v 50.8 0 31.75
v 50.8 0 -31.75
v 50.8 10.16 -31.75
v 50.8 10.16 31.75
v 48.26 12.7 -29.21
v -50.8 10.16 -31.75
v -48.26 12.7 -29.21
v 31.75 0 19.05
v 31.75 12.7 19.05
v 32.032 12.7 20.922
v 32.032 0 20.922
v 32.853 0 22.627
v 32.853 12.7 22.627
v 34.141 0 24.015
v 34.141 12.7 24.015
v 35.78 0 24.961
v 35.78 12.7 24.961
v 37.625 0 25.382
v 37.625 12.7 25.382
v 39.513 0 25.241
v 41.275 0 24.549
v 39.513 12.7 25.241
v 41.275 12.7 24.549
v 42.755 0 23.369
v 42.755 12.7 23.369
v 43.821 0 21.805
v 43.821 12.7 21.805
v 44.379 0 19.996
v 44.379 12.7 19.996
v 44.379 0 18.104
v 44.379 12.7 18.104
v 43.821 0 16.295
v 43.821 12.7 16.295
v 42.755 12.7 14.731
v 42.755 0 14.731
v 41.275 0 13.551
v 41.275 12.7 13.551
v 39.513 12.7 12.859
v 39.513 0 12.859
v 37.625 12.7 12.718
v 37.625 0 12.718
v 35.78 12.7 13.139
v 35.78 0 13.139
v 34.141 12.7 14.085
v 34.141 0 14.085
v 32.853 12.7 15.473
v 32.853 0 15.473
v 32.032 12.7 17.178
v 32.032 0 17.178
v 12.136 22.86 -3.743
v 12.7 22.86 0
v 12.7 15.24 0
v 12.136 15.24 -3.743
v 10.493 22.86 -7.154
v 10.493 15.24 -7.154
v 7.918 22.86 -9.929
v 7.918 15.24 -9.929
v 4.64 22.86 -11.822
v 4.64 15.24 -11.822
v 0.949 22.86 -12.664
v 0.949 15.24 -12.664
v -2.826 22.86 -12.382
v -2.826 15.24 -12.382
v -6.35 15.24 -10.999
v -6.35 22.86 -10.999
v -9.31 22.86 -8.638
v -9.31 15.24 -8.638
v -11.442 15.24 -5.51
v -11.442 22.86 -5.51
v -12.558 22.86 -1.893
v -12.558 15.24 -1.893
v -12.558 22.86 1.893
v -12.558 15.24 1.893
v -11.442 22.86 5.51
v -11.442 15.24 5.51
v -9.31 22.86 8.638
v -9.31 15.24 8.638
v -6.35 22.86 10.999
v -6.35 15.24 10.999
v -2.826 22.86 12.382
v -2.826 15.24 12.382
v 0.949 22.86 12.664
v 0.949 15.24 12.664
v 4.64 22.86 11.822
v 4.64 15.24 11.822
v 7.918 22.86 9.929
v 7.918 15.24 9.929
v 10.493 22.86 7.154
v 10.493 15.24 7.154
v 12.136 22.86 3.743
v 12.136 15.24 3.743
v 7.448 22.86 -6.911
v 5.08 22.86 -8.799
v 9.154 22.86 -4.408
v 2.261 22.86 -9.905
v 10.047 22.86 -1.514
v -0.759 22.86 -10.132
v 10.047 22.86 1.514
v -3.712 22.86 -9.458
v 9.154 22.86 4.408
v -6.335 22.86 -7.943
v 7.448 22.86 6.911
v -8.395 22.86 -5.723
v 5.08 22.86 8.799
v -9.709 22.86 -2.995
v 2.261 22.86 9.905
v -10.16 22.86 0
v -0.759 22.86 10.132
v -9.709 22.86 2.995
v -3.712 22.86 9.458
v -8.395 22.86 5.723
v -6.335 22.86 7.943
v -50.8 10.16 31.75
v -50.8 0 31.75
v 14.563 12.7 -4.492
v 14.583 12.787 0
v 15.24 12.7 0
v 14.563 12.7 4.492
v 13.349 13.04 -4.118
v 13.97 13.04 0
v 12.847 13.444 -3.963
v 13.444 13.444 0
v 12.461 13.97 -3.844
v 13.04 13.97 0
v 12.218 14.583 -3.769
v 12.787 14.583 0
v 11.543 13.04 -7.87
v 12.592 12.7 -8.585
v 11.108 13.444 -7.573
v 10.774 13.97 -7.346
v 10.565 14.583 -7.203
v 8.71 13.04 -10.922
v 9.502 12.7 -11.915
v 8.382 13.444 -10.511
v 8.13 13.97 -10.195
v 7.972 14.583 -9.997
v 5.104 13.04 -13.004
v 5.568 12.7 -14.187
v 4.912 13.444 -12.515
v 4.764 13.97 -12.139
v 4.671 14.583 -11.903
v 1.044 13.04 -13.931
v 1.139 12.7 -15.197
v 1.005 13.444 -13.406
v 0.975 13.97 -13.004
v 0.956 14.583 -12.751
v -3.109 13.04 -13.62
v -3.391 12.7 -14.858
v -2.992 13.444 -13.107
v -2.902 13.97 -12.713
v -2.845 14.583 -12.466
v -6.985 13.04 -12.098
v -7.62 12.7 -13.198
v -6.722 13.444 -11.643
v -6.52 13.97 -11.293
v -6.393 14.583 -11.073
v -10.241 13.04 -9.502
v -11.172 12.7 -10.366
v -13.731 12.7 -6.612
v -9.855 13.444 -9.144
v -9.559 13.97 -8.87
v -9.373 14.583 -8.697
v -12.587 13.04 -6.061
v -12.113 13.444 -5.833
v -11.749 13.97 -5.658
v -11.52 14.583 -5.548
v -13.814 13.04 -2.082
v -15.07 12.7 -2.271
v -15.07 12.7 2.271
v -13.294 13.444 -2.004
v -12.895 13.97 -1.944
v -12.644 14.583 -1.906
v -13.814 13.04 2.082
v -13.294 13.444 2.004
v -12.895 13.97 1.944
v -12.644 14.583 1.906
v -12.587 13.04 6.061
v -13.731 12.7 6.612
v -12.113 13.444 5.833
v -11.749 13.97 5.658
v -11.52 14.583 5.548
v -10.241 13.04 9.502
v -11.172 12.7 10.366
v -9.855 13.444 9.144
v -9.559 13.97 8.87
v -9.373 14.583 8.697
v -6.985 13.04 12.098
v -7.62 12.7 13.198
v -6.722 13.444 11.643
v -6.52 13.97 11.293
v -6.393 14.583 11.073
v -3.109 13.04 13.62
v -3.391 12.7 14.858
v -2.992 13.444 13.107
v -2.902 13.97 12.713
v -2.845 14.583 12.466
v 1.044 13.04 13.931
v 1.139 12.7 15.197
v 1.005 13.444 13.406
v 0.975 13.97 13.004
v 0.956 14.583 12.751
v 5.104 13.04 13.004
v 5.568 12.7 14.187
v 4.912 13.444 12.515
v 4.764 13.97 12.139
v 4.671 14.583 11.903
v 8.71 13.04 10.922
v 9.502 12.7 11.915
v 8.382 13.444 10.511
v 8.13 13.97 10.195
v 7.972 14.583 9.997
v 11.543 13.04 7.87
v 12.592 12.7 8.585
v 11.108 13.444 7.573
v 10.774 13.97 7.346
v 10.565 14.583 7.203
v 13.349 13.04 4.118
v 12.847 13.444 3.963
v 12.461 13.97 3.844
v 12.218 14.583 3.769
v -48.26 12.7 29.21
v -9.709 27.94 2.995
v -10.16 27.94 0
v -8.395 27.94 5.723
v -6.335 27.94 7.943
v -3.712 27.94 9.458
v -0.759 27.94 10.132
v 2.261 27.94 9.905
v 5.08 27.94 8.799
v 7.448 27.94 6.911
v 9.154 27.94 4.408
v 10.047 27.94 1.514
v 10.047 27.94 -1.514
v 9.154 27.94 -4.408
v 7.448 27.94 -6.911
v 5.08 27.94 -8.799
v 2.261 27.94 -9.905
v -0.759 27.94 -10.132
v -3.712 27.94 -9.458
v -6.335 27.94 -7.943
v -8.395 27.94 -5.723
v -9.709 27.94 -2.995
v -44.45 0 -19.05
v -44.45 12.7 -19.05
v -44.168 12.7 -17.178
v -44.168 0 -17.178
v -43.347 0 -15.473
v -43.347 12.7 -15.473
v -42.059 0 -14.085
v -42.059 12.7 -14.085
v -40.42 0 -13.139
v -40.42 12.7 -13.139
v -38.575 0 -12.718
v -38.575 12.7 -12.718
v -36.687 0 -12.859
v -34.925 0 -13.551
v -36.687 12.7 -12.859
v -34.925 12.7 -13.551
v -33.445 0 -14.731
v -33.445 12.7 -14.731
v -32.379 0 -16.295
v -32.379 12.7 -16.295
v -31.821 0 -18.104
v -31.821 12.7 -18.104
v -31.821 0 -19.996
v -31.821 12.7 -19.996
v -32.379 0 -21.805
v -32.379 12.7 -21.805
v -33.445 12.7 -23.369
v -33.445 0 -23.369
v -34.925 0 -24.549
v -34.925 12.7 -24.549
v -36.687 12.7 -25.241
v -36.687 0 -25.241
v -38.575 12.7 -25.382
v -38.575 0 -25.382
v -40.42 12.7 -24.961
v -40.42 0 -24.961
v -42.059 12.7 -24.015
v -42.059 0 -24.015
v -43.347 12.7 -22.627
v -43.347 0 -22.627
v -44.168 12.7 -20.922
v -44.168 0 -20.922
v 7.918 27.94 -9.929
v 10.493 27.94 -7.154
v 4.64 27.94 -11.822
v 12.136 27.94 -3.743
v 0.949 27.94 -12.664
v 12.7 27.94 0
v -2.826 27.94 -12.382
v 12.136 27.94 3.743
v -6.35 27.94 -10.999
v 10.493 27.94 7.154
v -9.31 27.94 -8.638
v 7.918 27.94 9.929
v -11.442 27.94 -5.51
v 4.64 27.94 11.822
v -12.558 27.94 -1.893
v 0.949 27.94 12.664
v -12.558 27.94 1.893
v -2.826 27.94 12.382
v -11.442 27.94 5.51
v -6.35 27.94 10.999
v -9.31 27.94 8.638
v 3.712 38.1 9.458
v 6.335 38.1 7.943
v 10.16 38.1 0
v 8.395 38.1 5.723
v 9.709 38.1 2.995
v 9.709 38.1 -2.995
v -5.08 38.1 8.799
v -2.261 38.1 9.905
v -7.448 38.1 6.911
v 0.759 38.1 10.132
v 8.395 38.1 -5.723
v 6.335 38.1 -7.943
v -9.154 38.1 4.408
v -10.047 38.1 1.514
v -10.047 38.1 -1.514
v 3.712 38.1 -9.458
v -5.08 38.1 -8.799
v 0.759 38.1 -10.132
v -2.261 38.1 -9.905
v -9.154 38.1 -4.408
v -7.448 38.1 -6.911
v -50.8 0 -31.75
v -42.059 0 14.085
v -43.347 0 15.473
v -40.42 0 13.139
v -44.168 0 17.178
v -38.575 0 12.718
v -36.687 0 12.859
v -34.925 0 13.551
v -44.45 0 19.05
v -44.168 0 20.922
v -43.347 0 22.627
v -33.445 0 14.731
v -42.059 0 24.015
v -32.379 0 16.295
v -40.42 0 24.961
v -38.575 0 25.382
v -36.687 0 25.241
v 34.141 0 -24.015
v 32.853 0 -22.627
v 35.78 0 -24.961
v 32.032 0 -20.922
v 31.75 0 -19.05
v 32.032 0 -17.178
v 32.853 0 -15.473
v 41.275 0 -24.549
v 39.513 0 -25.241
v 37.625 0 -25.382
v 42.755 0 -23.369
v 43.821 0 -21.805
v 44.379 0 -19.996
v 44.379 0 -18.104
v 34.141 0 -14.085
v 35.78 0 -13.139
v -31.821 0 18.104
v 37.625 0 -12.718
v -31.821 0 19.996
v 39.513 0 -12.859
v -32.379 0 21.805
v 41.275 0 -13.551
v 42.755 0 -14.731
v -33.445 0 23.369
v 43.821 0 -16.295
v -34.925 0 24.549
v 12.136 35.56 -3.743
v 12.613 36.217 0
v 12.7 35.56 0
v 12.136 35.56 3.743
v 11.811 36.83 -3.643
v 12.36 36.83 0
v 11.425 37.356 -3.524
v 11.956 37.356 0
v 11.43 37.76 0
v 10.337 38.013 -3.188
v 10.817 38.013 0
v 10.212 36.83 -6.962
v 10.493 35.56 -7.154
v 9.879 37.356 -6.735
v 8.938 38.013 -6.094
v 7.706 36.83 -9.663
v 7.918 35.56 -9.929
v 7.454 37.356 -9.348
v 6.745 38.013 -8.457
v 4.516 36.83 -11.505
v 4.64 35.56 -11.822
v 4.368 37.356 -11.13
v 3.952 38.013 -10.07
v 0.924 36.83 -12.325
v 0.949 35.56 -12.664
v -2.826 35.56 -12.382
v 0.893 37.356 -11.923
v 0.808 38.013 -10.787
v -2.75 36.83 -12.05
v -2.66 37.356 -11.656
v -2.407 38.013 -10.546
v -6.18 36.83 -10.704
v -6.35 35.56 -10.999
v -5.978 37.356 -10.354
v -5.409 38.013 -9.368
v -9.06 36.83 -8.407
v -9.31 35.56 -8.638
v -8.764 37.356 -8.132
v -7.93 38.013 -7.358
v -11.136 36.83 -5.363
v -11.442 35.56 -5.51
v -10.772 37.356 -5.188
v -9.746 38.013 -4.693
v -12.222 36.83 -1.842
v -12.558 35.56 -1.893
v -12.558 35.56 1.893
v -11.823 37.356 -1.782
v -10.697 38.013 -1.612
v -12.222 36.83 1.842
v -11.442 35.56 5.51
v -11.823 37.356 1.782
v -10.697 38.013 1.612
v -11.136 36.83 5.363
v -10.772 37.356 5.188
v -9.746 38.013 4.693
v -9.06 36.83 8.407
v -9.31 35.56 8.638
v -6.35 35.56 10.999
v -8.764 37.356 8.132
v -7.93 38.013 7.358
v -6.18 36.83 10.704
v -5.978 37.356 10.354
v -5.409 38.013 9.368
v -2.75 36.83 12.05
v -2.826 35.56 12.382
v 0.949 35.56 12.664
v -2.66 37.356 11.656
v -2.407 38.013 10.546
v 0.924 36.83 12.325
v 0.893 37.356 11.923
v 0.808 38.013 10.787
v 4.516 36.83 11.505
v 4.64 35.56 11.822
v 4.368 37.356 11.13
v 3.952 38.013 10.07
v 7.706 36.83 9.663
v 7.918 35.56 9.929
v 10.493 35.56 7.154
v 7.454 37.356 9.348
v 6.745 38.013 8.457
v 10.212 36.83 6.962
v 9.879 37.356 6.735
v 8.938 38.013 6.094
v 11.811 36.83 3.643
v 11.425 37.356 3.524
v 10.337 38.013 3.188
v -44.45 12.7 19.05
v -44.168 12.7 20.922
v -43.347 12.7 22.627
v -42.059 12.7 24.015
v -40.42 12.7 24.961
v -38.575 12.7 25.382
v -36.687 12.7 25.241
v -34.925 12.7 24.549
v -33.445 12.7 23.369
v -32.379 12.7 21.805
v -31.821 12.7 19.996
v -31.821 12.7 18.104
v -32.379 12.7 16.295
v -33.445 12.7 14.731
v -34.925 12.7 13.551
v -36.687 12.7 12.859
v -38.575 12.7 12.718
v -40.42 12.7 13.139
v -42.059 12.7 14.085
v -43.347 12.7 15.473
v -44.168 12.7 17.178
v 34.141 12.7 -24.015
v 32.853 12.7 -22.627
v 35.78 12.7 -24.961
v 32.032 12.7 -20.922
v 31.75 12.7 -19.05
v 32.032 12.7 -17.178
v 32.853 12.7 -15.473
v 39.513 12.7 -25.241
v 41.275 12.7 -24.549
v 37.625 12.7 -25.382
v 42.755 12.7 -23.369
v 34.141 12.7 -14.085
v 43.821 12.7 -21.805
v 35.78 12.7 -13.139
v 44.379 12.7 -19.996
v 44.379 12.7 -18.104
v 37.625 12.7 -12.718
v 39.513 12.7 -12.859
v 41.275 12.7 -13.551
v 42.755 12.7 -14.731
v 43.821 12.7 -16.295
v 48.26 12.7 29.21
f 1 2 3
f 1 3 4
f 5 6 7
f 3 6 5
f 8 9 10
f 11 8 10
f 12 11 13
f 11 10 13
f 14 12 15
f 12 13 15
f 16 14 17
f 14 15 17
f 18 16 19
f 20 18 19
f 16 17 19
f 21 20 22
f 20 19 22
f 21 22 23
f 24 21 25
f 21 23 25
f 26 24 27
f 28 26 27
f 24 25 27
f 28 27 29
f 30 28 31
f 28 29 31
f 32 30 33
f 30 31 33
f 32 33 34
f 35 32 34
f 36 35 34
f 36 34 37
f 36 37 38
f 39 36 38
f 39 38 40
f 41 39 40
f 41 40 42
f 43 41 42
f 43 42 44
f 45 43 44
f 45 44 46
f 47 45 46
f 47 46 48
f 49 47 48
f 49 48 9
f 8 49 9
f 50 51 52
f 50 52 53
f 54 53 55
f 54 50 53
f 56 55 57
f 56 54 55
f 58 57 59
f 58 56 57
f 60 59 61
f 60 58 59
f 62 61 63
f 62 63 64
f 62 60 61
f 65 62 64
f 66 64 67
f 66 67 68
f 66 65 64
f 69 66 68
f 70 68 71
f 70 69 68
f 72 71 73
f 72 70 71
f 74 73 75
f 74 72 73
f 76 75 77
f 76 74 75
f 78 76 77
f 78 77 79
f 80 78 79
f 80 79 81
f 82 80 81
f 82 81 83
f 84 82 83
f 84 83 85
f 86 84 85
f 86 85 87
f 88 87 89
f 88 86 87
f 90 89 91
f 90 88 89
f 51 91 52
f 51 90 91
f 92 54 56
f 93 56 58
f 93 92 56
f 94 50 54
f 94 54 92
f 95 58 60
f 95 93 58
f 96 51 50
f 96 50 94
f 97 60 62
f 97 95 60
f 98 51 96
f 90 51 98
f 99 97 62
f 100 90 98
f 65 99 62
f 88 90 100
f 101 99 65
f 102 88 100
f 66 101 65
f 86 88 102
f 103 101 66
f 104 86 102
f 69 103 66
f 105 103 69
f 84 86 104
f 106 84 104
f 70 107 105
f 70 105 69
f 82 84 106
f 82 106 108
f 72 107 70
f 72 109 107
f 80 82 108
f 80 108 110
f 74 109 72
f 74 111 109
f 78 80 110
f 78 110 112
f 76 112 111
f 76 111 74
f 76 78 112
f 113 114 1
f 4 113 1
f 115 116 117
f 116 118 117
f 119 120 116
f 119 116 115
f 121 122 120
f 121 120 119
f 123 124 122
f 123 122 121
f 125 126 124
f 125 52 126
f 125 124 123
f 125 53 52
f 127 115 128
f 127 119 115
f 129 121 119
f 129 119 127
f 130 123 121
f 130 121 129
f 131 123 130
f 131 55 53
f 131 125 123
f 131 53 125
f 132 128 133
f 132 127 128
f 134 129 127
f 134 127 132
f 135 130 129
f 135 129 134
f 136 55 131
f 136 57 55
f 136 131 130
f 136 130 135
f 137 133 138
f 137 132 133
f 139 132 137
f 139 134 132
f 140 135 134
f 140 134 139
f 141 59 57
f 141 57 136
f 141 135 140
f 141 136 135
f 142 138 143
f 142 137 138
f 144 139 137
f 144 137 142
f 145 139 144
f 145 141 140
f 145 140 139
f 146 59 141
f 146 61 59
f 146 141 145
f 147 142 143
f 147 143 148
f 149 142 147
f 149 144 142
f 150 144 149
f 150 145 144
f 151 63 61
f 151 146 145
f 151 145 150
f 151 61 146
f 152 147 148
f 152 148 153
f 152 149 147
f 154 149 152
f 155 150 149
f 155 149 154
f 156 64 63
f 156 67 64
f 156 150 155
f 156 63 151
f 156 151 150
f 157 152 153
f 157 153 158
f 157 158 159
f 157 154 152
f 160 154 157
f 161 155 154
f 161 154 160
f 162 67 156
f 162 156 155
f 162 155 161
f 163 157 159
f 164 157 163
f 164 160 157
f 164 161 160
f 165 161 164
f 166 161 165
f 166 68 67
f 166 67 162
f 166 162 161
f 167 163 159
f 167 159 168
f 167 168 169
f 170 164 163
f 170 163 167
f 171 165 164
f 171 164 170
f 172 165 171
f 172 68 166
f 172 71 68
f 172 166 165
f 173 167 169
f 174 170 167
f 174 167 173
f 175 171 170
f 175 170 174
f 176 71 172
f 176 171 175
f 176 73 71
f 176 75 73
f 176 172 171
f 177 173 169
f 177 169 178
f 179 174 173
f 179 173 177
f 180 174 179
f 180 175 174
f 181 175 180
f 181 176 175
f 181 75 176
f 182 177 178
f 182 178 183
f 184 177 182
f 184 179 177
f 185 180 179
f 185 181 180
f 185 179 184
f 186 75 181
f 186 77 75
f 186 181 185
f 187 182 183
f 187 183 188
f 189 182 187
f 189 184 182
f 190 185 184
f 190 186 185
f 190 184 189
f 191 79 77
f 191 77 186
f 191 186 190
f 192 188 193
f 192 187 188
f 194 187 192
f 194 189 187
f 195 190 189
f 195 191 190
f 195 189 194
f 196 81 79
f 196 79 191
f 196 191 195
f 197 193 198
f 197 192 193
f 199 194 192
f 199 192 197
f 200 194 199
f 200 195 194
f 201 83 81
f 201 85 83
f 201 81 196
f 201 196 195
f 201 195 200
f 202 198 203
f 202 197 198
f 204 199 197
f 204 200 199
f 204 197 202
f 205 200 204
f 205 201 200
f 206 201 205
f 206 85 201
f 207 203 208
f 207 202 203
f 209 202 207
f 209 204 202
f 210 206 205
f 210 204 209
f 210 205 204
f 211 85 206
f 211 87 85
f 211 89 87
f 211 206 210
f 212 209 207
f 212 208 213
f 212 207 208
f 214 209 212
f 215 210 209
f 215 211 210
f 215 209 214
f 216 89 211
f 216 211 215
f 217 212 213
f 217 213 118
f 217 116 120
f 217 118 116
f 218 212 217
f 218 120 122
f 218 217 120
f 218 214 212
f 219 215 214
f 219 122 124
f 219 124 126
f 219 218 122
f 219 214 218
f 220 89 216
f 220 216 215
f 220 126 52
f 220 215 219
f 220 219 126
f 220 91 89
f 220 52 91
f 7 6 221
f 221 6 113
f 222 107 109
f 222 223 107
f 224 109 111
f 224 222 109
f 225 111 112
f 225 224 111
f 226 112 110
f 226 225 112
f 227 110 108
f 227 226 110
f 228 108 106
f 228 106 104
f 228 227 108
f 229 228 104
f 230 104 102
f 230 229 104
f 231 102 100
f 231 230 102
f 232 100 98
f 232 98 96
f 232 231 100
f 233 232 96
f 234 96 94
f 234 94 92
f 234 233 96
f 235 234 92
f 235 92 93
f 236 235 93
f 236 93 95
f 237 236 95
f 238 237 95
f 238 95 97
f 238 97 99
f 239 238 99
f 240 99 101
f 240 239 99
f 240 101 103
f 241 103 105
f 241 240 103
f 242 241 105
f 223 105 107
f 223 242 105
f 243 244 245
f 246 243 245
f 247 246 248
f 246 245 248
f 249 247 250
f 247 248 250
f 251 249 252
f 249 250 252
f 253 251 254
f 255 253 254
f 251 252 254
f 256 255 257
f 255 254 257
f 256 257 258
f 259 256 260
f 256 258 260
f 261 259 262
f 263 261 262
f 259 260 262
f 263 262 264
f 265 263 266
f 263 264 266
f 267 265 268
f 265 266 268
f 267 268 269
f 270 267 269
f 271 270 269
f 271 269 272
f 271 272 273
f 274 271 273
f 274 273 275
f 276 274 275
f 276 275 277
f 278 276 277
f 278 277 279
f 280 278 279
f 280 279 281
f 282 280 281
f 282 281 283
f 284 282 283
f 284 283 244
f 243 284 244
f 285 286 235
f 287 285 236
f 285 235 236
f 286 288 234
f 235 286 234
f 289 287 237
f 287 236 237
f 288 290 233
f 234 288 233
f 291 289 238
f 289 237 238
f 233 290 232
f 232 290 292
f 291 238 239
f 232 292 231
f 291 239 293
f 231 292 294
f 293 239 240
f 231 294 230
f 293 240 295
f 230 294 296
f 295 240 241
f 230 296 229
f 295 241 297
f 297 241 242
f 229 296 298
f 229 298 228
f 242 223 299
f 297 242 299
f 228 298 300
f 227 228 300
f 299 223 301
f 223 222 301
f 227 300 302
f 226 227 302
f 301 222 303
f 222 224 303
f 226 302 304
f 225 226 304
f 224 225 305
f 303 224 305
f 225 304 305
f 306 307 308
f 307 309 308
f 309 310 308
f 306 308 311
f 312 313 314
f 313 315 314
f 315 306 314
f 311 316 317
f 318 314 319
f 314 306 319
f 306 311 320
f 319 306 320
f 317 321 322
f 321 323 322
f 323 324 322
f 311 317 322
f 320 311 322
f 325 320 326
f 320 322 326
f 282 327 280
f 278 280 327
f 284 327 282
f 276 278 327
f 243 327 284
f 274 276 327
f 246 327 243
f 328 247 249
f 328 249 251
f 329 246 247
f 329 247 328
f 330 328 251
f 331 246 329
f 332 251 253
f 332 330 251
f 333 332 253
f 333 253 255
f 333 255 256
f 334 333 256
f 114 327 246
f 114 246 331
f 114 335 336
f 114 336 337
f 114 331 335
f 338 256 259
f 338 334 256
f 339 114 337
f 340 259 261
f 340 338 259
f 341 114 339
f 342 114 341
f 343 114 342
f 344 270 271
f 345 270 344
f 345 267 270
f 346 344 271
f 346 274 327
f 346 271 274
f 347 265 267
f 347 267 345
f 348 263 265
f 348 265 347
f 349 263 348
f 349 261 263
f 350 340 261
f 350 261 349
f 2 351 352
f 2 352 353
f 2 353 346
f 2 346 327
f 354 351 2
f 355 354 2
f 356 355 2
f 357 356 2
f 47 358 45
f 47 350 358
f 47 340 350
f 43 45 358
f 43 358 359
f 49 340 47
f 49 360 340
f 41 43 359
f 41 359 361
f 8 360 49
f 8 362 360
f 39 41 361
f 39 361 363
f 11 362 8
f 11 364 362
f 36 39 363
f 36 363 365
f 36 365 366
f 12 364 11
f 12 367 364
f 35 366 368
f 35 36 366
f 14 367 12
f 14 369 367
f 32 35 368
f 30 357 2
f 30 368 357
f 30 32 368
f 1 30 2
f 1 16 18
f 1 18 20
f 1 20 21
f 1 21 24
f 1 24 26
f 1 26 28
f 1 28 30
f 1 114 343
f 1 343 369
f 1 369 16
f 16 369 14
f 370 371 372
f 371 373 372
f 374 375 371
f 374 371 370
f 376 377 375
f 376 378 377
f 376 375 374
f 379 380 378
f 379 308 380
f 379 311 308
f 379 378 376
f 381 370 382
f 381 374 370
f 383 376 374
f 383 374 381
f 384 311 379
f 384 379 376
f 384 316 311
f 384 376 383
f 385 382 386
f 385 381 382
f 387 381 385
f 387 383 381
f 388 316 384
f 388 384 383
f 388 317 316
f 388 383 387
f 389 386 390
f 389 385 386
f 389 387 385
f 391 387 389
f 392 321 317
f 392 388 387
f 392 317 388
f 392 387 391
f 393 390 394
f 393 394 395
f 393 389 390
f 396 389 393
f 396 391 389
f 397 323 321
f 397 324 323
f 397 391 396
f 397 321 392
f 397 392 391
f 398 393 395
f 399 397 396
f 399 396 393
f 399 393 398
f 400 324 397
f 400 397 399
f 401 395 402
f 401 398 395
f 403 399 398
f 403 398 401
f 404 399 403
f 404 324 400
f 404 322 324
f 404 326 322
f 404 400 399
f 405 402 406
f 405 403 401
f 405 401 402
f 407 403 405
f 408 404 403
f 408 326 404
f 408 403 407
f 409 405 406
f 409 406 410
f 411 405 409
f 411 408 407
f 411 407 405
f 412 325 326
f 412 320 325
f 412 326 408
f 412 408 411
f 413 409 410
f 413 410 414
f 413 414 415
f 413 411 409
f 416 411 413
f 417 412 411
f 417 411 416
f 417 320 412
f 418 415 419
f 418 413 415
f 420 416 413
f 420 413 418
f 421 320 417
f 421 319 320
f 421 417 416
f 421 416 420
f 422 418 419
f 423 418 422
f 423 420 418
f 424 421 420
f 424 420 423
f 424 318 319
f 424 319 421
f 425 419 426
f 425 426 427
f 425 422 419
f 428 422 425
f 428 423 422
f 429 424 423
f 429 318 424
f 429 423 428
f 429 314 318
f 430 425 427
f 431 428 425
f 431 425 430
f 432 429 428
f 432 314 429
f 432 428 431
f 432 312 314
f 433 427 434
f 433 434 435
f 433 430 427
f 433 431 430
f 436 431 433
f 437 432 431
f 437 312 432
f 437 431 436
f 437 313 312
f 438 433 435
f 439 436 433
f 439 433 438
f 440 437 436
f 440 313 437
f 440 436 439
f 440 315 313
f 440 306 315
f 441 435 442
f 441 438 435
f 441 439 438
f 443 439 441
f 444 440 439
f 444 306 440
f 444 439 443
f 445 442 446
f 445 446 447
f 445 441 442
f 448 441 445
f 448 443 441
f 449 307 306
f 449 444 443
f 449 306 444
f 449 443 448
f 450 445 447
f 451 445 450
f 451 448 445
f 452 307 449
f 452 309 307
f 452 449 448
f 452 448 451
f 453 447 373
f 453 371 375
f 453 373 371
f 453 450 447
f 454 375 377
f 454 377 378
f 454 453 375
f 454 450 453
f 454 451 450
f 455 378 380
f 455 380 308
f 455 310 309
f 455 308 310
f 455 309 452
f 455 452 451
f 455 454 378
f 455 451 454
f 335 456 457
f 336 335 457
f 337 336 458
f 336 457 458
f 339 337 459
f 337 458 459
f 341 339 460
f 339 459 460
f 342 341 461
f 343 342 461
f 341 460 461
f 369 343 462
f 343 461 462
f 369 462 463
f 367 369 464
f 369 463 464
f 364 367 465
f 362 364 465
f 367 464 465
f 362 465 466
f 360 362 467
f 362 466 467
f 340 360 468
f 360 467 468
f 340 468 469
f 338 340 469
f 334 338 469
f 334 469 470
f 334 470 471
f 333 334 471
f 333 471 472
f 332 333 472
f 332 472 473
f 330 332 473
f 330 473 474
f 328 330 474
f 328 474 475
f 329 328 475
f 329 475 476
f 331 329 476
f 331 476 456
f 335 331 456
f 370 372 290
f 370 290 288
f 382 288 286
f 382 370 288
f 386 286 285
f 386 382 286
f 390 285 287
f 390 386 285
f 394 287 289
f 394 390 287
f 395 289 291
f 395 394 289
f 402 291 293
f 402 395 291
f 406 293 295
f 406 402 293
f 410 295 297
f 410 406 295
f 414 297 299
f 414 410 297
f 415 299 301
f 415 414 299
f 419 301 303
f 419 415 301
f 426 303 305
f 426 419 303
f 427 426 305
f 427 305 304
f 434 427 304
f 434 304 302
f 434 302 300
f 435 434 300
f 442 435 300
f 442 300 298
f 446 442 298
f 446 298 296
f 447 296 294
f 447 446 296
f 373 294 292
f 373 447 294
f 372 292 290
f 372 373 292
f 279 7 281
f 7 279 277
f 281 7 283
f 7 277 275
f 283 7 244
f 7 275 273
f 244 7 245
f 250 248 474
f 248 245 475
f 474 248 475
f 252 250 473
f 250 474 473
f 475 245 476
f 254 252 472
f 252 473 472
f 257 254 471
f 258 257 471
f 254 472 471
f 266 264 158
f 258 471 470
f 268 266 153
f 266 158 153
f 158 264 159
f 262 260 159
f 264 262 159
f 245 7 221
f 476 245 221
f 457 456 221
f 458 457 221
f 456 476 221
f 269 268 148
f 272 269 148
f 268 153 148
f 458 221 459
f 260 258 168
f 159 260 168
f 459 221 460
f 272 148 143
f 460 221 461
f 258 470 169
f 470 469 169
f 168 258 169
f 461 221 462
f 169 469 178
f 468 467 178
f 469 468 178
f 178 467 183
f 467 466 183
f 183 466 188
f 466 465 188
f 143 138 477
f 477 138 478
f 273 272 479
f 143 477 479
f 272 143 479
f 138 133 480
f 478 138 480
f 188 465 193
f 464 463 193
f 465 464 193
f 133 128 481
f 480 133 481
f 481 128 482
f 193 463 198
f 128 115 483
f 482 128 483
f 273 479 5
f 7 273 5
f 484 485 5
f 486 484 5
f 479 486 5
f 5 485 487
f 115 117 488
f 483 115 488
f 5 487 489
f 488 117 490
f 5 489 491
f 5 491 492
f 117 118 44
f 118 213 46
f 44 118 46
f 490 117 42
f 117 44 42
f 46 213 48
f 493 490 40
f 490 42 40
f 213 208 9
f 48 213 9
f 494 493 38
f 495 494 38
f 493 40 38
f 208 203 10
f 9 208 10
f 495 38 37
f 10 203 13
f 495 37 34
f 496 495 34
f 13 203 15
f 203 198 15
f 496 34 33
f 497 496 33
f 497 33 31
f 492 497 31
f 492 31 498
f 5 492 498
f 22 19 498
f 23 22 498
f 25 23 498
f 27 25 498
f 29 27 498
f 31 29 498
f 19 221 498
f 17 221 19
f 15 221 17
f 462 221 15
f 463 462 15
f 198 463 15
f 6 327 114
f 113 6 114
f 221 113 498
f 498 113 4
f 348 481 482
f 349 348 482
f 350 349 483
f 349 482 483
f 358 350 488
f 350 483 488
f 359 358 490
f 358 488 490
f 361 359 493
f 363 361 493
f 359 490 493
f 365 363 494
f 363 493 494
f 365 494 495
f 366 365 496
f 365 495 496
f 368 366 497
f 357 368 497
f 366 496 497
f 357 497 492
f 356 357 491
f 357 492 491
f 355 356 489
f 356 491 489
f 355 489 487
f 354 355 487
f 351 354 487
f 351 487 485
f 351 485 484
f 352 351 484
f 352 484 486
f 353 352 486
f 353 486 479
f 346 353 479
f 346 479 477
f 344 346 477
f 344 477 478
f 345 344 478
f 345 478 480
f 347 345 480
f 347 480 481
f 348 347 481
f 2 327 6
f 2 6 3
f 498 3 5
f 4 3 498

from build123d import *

# Parameters (mm, degrees)
F0_W     = 101.6
F0_H     = 63.5
F1_DEPTH = 12.7
F2_R     = 6.35
F3_DEPTH = 12.701
F4_W     = 12.7
F4_H     = 25.4
F6_W     = 9.067975
F6_H     = 5.08
F8_R     = 2.54
F9_SIZE  = 2.54


with BuildPart() as f1:
    # F0 (on Front) → F1 (new body)
    with BuildSketch(Plane.XZ):
        Rectangle(F0_W, F0_H)
    extrude(amount=-F1_DEPTH)

    # F2 (on face) → F3 (cut, through all)
    with BuildSketch(Plane(origin=(0, 12.7, 0), x_dir=(-1, 0, 0), z_dir=(0, 1, 0))):
        with Locations((38.1, -19.05)):
            Circle(F2_R)
        with Locations((-38.1, -19.05)):
            Circle(F2_R)
        with Locations((38.1, 19.05)):
            Circle(F2_R)
        with Locations((-38.1, 19.05)):
            Circle(F2_R)
    extrude(amount=-F3_DEPTH, mode=Mode.SUBTRACT)

    # F4 (on Top) → F5 (revolve)
    with BuildSketch(Plane.XY):
        with Locations((6.35, 25.4)):
            Rectangle(F4_W, F4_H)
    revolve(axis=Axis((0, 25.4, 0), (0, 1, 0)))

    # F6 (on Top) → F7 (revolve, cut)
    with BuildSketch(Plane.XY):
        with Locations((-14.693988, 25.4)):
            Rectangle(F6_W, F6_H)
    revolve(axis=Axis((0, 12.7, 0), (0, 1, 0)), mode=Mode.SUBTRACT)

    # F8
    f8_edges = [f1.edges().sort_by_distance(p)[0] for p in [
        (-12.7, 12.7, 0),
        (-12.7, 38.1, 0),
    ]]
    fillet(f8_edges, radius=F8_R)

    # F9
    f9_edges = [f1.edges().sort_by_distance(p)[0] for p in [
        (0, 12.7, -31.75),
        (50.8, 12.7, 0),
        (0, 12.7, 31.75),
        (-50.8, 12.7, 0),
    ]]
    chamfer(f9_edges, length=F9_SIZE)


solid = f1.part
